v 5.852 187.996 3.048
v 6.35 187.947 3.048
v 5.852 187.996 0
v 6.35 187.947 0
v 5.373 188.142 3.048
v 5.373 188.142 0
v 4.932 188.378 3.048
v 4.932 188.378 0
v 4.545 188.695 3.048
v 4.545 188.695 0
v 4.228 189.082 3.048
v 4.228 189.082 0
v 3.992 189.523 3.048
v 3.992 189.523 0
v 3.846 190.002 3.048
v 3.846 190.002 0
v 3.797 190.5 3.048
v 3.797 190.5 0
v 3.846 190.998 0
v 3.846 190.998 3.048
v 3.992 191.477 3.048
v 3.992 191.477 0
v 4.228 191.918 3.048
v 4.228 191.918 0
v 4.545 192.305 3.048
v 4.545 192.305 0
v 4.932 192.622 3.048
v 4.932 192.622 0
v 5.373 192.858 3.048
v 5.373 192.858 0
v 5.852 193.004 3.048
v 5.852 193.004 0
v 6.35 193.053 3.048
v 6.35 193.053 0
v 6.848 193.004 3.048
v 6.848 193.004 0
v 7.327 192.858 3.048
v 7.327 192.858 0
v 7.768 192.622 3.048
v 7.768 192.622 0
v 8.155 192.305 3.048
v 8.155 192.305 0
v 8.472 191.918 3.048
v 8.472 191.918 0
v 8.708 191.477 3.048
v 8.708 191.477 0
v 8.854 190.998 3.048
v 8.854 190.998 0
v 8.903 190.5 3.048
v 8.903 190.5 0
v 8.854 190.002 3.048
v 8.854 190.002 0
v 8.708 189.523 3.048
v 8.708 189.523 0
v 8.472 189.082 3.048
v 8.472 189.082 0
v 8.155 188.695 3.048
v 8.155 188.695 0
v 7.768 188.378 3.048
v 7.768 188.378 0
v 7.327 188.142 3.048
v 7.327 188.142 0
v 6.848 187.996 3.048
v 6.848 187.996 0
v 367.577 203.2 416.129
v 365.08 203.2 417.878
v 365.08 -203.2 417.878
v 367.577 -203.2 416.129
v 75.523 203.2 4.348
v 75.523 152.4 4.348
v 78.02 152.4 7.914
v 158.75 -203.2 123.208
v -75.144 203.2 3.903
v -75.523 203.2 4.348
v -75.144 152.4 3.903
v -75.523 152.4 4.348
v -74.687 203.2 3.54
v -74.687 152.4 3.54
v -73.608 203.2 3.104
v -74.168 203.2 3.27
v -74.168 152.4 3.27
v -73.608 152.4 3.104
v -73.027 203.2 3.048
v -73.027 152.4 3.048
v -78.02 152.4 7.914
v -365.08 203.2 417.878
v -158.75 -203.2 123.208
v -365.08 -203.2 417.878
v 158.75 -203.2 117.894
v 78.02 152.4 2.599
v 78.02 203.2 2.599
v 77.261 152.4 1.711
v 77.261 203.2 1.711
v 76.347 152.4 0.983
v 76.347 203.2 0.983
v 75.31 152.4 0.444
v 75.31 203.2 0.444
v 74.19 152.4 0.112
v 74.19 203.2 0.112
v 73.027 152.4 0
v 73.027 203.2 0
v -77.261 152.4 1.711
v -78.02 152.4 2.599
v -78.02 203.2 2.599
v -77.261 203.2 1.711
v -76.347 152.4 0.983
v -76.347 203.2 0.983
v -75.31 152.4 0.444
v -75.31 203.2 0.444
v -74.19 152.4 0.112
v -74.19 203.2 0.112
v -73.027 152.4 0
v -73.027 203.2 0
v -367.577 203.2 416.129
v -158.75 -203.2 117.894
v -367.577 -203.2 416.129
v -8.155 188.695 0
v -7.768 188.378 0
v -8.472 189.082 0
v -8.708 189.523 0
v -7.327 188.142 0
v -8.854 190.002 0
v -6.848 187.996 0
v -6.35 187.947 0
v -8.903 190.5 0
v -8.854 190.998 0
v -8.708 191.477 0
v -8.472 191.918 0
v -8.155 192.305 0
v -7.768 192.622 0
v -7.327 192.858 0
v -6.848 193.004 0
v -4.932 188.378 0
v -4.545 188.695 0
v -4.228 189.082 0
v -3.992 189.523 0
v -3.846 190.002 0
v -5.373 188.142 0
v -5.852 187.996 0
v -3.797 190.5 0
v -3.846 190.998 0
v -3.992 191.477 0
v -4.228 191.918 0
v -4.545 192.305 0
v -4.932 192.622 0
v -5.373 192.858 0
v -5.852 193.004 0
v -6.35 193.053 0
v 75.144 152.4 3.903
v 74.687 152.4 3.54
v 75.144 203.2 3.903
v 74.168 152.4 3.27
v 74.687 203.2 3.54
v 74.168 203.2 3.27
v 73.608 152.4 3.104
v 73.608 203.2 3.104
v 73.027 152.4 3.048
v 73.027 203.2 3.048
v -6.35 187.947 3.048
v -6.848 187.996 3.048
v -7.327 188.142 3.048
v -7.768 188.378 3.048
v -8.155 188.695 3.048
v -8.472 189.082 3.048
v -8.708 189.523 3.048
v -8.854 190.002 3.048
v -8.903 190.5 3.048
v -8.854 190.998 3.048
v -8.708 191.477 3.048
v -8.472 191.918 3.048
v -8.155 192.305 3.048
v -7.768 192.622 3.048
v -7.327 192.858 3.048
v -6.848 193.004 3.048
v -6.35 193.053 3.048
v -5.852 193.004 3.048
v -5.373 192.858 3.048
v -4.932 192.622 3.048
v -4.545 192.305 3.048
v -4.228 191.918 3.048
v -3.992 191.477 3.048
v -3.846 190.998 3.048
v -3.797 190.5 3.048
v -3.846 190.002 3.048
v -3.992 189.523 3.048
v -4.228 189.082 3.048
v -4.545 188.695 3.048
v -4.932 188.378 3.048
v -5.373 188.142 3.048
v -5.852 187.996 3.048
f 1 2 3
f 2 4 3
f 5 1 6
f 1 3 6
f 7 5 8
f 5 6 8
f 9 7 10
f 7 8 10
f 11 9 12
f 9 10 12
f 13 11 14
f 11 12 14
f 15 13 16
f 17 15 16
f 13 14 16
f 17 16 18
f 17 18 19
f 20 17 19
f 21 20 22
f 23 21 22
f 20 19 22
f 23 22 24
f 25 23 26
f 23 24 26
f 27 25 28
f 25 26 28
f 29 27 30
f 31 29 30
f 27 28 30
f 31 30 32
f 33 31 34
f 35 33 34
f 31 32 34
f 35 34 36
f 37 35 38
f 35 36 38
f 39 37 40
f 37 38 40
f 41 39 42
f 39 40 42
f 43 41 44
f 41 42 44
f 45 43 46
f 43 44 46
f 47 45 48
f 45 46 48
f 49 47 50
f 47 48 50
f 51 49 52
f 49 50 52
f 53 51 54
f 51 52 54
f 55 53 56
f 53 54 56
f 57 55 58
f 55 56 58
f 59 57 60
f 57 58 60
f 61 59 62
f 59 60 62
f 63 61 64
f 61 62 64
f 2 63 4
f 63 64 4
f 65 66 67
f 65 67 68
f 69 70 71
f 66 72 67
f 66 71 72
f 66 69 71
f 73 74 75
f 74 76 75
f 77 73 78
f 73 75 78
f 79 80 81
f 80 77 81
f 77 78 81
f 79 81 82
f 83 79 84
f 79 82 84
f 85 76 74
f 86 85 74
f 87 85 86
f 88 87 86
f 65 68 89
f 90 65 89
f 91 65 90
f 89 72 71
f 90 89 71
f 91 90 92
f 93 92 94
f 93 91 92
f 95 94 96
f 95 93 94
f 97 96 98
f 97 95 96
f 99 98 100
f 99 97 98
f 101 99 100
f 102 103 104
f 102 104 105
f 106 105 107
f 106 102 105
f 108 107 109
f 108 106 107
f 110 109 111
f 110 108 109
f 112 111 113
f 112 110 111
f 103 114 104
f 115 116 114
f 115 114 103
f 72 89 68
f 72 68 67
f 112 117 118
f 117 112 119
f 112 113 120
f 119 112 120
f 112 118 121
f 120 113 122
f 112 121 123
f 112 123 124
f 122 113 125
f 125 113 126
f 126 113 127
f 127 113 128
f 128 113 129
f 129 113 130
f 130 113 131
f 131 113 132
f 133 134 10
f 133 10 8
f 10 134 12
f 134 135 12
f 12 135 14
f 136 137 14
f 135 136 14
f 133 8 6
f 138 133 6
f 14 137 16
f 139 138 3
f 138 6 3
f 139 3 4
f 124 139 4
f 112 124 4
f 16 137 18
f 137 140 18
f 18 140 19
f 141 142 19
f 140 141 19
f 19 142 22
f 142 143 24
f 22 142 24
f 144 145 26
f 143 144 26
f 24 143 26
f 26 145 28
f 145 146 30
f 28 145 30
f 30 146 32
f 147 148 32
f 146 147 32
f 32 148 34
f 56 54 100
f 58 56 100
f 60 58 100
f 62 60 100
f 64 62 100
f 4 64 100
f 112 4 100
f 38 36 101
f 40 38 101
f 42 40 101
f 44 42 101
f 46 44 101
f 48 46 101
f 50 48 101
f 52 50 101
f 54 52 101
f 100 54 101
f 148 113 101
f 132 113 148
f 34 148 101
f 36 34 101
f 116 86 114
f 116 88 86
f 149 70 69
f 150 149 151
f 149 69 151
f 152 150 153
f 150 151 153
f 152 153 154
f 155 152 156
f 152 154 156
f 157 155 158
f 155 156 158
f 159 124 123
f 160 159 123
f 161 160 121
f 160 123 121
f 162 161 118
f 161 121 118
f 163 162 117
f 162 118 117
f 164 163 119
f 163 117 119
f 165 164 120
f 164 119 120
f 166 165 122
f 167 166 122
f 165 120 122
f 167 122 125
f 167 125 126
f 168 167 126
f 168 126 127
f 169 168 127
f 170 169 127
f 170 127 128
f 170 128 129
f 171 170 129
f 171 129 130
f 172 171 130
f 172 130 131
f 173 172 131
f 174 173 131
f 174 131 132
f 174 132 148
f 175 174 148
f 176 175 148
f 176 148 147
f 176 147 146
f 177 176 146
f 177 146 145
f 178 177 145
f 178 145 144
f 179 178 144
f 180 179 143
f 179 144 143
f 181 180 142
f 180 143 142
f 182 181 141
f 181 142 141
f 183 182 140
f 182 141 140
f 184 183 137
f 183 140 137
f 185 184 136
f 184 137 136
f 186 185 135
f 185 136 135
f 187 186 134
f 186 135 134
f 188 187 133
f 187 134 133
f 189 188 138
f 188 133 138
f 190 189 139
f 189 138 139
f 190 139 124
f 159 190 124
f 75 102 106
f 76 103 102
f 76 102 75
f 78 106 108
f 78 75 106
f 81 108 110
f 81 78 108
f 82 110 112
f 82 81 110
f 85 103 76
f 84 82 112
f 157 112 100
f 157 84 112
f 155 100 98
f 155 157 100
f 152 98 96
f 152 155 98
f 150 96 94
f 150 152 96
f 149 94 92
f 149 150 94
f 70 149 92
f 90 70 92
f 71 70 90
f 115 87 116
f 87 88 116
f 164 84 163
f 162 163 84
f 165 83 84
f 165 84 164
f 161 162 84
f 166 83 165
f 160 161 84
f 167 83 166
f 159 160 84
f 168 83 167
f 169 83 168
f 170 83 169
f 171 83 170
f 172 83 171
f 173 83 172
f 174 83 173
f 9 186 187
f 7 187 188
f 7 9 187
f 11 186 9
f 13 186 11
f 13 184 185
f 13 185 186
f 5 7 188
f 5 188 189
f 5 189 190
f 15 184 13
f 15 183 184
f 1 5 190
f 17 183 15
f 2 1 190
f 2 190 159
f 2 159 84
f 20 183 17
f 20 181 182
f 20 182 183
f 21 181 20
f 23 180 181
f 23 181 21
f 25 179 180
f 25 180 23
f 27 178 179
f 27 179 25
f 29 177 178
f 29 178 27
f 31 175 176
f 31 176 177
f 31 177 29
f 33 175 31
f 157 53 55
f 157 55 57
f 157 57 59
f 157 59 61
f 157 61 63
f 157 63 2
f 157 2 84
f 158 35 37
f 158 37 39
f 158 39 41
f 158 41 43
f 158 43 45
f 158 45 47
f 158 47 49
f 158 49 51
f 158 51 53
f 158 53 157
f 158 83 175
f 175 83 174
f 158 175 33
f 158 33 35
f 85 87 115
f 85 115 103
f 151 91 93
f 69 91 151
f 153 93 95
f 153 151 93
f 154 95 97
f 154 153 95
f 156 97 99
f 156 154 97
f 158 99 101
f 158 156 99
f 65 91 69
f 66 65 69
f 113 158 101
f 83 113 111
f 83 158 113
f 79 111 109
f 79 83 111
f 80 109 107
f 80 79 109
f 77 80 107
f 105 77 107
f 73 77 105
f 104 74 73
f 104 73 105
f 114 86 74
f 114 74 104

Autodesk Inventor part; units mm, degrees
ref_plane "YZ Plane" through (0, 0, 0) normal (1, 0, 0) x (0, 1, 0)
ref_plane "XZ Plane" through (0, 0, 0) normal (0, 1, 0) x (-1, 0, 0)
ref_plane "XY Plane" through (0, 0, 0) normal (0, 0, 1) x (1, 0, 0)
sketch "Sketch1" plane through (0, 0, 0) normal (0, 0, 1) x (1, 0, 0)
  line L0 (-76.2, -203.2) -> (76.2, -203.2)
  line L1 (76.2, -203.2) -> (76.2, 203.2)
  line L2 (76.2, 203.2) -> (-76.2, 203.2)
  line L3 (-76.2, 203.2) -> (-76.2, -203.2)
  line L4 (-76.2, -203.2) -> (76.2, 203.2) construction
  line L5 (76.2, -203.2) -> (-76.2, 203.2) construction
  point P0 (0, 0)
  dimension "d0" = 152.4
  dimension "d1" = 406.4
extrude "Plate1" add sketch "Sketch1" along normal blind 3.048
sketch "Sketch2" plane through (73.7032, 203.2, 1.7483) normal (0.819152, 0, -0.5735764) x (0, 1, 0)
  line L0 (-406.4, 0) -> (0, 0)
  line L1 (0, 0) -> (0, 508)
  line L2 (0, 508) -> (-406.4, 508)
  line L3 (-406.4, 508) -> (-406.4, 0)
edge flange "Flange1" height 508 angle 55 thickness 3.048 bend radius 3.048 thickness toward (0.819152, 0, -0.5735764) relief tear relief width 3.048 relief depth 1.524 corner gap 3.048 corner form 0 edges at (76.2, 0, 3.048) (-76.2, 0, 3.048) wall of the first edge with corners at (73.7032, -203.2, 1.7483) (73.7032, 203.2, 1.7483) (365.0801, 203.2, 417.8775) (365.0801, -203.2, 417.8775)
bend "Bend1"
corner "Corner1"
sketch "Sketch3" plane through (0, 0, 3.048) normal (0, 0, 1) x (1, 0, 0)
  line L0 (-78.0202, -203.2) -> (-78.0202, 152.4)
  line L1 (-78.0202, 152.4) -> (78.0202, 152.4)
  line L2 (78.0202, 152.4) -> (78.0202, -203.2)
  line L3 (-158.75, -203.2) -> (-78.0202, 152.4)
  line L4 (158.75, -203.2) -> (78.0202, 152.4)
  line L5 (-75.5234, -203.2) -> (-365.0801, -203.2) projected
  line L6 (75.5234, -203.2) -> (365.0801, -203.2) projected
  line L7 (-158.75, -203.2) -> (158.75, -203.2)
  line L8 (-78.0202, 203.2) -> (-78.0202, -203.2) construction
  line L9 (78.0202, -203.2) -> (78.0202, 203.2) projected
  line L10 (-73.0266, 203.2) -> (73.0266, 203.2) projected
  line L11 (73.0266, -203.2) -> (-73.0266, -203.2) projected
  point P0 (0, -203.2)
  point P1 (0, -203.2)
  dimension "d25" = 317.5
  dimension "d28" = 50.8
extrude "Cut1" cut sketch "Sketch3" against normal mid plane 508
sketch "Sketch4" plane through (0, 0, 3.048) normal (0, 0, 1) x (1, 0, 0)
  line L0 (-73.0266, 152.4) -> (73.0266, 152.4) construction
  line L1 (73.0266, 152.4) -> (73.0266, 203.2) construction
  line L2 (-73.0266, 203.2) -> (73.0266, 203.2) construction
  line L3 (-73.0266, 203.2) -> (-73.0266, 152.4) construction
  line L4 (0, 203.2) -> (0, 152.4) construction
  line L5 (0, 190.5) -> (6.35, 190.5)
  point P0 (0, 0)
  point P1 (-6.35, 190.5)
  dimension "d16" = 6.35
  dimension "d17" = 12.7
hole "Hole1" at (6.35, 190.5, 3.048) at (-6.35, 190.5, 3.048) direction (0, 0, -1) diameter 5.1054 end through all clearance for "Flat Head Machine Screw (82)" size "#10" standard "Ansi Unified Screw Threads"
equation "\"d23\" = Thickness"
equation "\"d2\" = Thickness"
equation "\"d3\" = BendReliefWidth"
equation "\"d4\" = BendReliefDepth"
equation "\"d5\" = MinimumRemnant"
equation "\"d6\" = TransitionRadius"
equation "\"d9\" = BendRadius"
equation "\"d10\" = CornerReliefSize"
equation "\"d11\" = GapSize"
equation "\"d12\" = JacobiRadiusSize"
equation "\"BendRadius\" = Thickness"
equation "\"BendReliefWidth\" = Thickness"
equation "\"BendReliefDepth\" = 0.5 * Thickness"
equation "\"CornerReliefSize\" = 4 * Thickness"
equation "\"MinimumRemnant\" = 2 * Thickness"
equation "\"TransitionRadius\" = BendRadius"
equation "\"JacobiRadiusSize\" = BendRadius"
equation "\"GapSize\" = Thickness"
equation "\"Thickness\" = 3.048"
properties part number "hopper" material "Polycarbonate, Smoke"
